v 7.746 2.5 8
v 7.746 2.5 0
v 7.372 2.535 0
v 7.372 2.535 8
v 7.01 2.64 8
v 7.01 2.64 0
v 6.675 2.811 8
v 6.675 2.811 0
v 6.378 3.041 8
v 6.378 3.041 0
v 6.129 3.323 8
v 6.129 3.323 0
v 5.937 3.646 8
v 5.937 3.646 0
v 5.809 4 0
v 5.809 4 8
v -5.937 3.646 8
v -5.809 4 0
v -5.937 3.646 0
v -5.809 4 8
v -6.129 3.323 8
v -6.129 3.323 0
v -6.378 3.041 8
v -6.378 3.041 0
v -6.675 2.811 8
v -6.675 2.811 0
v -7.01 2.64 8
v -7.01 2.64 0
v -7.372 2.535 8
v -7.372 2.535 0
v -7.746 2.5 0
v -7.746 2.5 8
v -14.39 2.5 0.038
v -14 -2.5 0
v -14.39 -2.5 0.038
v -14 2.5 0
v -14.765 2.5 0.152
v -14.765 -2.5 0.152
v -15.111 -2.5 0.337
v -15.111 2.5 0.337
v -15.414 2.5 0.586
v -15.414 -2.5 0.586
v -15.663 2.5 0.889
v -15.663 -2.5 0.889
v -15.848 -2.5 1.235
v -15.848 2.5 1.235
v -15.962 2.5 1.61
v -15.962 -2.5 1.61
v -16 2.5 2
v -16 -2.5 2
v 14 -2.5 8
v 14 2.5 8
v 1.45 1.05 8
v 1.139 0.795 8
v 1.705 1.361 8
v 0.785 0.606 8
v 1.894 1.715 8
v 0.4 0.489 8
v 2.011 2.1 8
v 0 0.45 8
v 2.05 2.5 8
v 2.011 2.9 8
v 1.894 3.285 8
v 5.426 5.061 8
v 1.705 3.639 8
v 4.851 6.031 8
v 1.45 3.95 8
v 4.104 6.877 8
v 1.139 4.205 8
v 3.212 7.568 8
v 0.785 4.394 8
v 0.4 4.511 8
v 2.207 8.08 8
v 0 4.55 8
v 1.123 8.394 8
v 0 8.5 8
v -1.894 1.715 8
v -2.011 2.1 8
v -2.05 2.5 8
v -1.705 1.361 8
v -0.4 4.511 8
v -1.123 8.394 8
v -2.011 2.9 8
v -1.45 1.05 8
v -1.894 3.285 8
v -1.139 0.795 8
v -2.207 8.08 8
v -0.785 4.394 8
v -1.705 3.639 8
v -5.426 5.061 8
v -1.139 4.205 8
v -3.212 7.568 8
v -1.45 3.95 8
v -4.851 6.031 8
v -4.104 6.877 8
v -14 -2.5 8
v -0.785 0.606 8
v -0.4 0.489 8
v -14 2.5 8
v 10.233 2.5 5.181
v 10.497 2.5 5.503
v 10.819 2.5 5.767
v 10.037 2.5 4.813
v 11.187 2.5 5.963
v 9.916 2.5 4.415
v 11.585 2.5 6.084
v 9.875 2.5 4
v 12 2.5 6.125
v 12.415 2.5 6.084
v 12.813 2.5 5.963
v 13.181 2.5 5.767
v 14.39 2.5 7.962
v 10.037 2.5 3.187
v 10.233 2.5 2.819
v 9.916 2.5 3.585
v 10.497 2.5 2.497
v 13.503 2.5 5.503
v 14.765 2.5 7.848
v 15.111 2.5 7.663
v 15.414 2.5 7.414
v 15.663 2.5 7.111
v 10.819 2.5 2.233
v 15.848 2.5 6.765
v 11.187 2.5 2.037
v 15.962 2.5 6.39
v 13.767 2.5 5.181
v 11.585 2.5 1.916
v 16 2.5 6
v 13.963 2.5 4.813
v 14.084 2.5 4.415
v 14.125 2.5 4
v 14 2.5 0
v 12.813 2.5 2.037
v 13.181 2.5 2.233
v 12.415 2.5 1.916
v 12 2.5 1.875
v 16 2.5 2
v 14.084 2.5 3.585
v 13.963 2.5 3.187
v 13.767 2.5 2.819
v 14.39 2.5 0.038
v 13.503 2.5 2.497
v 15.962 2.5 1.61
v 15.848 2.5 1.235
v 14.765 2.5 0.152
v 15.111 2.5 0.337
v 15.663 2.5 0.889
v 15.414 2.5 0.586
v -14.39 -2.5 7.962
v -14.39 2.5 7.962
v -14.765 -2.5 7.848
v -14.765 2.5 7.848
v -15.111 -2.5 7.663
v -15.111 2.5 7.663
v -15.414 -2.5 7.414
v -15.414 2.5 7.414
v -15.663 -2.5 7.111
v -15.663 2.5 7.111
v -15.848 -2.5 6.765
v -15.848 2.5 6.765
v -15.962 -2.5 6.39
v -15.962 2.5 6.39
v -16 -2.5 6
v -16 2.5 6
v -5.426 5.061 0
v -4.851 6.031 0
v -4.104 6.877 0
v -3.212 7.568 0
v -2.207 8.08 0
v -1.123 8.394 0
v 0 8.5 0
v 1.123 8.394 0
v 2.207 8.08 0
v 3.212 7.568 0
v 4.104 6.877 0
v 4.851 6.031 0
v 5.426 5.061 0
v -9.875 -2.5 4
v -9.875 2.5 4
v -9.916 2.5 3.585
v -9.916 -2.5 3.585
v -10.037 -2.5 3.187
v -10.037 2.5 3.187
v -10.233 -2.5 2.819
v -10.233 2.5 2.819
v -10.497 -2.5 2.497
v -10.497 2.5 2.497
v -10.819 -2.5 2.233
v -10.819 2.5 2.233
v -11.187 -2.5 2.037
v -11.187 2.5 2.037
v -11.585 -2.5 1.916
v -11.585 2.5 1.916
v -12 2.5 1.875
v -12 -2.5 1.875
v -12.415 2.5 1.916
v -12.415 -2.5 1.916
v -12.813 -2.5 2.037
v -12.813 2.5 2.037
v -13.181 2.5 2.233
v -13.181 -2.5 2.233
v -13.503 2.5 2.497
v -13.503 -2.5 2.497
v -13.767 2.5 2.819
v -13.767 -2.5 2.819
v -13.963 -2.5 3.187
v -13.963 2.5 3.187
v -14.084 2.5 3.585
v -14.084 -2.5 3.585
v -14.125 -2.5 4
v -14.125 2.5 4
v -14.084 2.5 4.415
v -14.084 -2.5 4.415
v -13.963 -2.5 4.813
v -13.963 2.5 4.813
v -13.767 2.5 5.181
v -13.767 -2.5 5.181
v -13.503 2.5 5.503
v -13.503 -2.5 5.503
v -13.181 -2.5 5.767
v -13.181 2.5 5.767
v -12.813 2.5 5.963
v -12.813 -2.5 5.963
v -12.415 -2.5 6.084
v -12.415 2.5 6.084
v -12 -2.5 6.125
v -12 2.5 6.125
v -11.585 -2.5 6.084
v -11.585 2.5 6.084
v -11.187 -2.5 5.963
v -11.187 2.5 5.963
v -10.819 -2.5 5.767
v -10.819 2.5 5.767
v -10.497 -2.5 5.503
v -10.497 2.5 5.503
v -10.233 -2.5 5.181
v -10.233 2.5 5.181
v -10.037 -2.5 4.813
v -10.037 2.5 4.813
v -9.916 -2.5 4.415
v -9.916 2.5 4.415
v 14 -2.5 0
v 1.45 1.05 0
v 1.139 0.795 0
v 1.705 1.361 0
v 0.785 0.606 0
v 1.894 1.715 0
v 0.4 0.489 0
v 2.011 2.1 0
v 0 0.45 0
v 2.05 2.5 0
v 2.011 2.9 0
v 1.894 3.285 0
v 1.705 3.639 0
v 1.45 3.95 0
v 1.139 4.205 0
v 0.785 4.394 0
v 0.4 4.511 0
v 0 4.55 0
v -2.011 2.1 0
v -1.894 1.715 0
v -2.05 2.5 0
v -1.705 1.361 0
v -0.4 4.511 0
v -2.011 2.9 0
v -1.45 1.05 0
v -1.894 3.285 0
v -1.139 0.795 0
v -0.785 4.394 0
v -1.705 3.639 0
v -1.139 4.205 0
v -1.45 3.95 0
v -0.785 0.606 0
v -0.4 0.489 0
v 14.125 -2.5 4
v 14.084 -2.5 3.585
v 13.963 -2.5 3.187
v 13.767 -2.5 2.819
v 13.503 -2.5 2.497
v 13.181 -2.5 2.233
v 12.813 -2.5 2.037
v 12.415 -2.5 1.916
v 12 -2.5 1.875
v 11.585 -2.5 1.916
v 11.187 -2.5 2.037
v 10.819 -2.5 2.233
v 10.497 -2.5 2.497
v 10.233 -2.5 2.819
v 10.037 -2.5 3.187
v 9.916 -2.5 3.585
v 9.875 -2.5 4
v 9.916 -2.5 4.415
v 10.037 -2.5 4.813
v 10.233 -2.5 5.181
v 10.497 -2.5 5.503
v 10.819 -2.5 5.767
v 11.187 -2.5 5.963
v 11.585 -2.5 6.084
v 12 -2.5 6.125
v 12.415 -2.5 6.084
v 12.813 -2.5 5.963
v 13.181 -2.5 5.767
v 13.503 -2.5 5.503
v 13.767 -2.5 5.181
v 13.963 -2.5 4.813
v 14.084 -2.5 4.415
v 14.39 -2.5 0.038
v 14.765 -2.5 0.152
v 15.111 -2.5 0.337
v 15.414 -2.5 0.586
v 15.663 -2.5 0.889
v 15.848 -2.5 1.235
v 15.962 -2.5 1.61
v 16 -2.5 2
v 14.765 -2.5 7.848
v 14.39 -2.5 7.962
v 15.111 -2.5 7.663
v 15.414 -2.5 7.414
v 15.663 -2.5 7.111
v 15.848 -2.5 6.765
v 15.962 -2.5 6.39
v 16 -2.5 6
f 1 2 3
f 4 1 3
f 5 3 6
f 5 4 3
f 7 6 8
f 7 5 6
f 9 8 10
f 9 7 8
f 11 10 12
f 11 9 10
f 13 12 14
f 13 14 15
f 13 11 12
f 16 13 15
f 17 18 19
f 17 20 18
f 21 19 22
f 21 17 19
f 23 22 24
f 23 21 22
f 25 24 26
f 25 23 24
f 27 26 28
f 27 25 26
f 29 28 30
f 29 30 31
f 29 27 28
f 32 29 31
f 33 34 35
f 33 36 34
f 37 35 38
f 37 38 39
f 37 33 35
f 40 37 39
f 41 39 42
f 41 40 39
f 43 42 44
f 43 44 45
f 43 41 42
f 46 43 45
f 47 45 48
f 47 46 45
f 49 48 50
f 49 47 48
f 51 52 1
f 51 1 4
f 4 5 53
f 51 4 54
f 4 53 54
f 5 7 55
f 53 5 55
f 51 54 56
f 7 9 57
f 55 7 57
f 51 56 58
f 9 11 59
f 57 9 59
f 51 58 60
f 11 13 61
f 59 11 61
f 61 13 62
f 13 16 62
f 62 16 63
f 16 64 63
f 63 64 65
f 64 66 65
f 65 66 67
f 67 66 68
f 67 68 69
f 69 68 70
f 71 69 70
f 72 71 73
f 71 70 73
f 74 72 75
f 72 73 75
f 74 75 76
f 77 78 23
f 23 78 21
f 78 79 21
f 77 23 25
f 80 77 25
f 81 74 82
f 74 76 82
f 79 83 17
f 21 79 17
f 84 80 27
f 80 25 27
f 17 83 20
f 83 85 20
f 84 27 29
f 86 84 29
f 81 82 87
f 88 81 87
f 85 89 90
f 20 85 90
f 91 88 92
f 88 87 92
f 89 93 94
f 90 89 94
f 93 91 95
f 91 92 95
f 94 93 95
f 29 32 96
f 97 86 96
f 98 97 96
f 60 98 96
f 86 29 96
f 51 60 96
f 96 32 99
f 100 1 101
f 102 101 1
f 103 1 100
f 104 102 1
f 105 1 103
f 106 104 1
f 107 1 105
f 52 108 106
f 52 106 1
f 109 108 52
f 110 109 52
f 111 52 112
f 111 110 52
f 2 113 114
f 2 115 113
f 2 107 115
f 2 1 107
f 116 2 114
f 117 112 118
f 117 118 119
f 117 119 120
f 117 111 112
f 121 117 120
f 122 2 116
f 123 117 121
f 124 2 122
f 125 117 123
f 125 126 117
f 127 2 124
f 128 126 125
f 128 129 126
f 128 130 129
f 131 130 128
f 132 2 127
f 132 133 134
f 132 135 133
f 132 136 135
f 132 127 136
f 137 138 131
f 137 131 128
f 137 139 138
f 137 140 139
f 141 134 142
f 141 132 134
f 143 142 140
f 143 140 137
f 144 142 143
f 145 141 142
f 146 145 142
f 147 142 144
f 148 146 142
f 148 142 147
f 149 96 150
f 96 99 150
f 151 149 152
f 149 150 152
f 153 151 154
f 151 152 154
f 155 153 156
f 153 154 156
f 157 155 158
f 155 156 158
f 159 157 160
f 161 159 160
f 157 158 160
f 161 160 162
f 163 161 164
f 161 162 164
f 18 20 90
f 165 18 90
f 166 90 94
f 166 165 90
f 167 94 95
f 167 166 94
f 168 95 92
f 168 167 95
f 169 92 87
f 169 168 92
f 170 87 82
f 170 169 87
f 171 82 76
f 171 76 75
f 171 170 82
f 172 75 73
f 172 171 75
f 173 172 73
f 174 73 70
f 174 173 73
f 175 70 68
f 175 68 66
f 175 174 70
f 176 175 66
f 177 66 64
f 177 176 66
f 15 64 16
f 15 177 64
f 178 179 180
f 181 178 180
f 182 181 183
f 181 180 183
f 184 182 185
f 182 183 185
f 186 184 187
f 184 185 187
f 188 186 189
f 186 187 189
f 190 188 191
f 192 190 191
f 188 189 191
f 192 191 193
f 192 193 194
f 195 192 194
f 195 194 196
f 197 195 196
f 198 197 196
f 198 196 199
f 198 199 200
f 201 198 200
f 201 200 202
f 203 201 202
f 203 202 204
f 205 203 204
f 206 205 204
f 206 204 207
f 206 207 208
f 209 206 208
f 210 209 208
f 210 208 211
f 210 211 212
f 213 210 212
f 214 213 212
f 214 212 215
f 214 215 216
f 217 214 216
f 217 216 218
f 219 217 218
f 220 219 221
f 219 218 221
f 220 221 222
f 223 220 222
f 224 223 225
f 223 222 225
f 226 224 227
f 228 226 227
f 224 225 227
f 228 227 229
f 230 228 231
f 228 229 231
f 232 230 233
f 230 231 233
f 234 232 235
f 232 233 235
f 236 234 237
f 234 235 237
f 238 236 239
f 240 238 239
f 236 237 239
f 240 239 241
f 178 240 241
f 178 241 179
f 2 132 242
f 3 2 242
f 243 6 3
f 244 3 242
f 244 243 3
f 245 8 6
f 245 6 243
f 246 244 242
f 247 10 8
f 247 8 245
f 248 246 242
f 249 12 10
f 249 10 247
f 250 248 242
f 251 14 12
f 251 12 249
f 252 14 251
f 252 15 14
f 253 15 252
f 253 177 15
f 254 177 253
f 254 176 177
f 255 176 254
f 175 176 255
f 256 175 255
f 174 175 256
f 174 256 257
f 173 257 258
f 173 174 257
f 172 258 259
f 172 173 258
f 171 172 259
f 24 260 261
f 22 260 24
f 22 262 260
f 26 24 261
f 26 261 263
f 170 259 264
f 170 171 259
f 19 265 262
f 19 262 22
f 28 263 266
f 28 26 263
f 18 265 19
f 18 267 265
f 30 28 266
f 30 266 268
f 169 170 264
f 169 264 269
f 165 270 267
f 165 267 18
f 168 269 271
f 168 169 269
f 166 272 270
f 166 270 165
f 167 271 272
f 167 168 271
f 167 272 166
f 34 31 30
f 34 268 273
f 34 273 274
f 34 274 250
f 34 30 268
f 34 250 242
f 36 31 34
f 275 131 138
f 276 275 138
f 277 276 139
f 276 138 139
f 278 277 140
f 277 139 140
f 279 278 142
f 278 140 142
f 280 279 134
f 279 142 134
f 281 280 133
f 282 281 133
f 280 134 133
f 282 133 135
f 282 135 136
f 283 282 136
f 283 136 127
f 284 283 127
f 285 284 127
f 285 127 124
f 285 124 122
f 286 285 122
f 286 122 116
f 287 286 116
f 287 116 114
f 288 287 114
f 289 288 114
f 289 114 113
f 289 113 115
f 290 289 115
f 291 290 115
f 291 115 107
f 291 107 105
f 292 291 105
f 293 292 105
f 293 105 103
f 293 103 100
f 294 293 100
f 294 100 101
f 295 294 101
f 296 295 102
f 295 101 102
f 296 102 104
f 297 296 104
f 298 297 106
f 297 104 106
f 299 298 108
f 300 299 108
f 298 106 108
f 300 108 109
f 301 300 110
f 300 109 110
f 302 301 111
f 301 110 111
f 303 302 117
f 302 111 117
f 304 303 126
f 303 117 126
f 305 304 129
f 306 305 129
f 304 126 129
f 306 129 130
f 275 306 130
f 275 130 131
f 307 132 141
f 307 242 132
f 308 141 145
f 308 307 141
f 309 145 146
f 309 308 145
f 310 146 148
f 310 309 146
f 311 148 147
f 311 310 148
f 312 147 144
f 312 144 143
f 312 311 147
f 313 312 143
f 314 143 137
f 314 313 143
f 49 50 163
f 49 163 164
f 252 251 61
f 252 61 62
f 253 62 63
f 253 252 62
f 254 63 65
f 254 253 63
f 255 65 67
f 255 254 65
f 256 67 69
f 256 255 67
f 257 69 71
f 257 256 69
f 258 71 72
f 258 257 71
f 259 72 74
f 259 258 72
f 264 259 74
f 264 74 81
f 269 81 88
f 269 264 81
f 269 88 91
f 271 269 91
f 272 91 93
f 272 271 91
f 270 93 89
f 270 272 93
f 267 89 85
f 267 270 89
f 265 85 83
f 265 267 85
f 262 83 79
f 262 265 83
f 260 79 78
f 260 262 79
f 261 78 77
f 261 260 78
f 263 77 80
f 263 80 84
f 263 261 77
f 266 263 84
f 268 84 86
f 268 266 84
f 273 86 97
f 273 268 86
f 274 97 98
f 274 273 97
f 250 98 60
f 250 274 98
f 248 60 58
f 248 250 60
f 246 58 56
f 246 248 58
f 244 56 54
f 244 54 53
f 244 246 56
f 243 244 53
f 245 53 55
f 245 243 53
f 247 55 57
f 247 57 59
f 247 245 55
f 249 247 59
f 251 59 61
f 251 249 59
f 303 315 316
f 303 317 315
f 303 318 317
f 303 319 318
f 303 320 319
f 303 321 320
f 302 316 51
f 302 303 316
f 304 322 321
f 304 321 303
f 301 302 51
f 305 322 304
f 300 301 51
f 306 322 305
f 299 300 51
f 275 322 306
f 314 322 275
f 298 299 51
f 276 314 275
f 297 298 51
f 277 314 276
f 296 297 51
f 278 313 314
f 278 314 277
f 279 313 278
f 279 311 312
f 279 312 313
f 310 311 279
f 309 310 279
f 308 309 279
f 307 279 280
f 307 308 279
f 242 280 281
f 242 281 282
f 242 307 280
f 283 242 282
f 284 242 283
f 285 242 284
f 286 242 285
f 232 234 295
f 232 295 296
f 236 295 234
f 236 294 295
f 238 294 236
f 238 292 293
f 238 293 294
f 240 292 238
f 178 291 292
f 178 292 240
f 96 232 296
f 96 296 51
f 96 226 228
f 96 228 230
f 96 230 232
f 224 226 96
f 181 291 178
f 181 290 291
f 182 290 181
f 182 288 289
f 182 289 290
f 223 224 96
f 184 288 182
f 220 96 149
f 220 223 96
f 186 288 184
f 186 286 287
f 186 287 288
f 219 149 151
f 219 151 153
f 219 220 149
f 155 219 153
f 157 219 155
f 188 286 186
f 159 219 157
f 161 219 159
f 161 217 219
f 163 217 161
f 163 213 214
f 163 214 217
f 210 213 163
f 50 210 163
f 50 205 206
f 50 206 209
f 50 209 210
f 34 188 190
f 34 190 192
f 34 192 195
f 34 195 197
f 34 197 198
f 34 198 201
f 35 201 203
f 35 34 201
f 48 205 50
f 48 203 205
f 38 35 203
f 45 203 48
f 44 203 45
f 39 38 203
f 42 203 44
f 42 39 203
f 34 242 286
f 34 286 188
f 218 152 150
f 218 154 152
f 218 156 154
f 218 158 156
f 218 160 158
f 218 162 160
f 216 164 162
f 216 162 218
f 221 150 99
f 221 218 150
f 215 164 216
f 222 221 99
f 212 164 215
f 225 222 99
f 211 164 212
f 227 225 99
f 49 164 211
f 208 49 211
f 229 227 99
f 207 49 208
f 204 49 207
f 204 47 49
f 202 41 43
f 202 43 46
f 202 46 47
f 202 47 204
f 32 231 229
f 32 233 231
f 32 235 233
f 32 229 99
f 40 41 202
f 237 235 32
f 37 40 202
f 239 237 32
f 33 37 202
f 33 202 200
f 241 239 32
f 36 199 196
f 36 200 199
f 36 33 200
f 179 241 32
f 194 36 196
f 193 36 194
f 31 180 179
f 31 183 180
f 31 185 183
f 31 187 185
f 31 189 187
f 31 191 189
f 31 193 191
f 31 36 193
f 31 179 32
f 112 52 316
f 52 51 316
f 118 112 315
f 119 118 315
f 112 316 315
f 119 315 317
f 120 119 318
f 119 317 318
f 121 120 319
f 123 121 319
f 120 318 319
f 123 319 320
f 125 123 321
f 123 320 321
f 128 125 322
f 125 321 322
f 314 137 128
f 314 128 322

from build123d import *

# Parameters (mm, degrees)
SKETCH2_R           = 2.05
BOSS_EXTRUDE1_DEPTH = 8
SKETCH3_R           = 2.125
CUT_EXTRUDE1_DEPTH  = 8
FILLET1_R           = 2


with BuildPart() as part:
    # Sketch2 → Boss-Extrude1 (new body)
    with BuildSketch(Plane.XY):
        with BuildLine():
            Line((6, 2.5), (16, 2.5))
            Line((16, 2.5), (16, -2.5))
            Line((16, -2.5), (-16, -2.5))
            Line((-16, -2.5), (-16, 2.5))
            Line((-16, 2.5), (-6, 2.5))
            ThreePointArc((-6, 2.5), (0, 8.5), (6, 2.5))
        make_face()
        with Locations((0, 2.5)):
            Circle(SKETCH2_R, mode=Mode.SUBTRACT)
    extrude(amount=BOSS_EXTRUDE1_DEPTH)

    # Sketch3 → Cut-Extrude1 (cut)
    with BuildSketch(Plane(origin=(0, 2.5, 0), x_dir=(1, 0, 0), z_dir=(0, 1, 0))):
        with Locations((12, -4)):
            Circle(SKETCH3_R)
        with Locations((-12, -4)):
            Circle(SKETCH3_R)
    extrude(amount=-CUT_EXTRUDE1_DEPTH, mode=Mode.SUBTRACT)

    # Fillet1
    fillet1_edges = [part.edges().sort_by_distance(p)[0] for p in [
        (-6, 2.5, 4),
        (6, 2.5, 4),
        (-16, 0, 8),
        (16, 0, 8),
        (-16, 0, 0),
        (16, 0, 0),
    ]]
    fillet(fillet1_edges, radius=FILLET1_R)


solid = part.part
